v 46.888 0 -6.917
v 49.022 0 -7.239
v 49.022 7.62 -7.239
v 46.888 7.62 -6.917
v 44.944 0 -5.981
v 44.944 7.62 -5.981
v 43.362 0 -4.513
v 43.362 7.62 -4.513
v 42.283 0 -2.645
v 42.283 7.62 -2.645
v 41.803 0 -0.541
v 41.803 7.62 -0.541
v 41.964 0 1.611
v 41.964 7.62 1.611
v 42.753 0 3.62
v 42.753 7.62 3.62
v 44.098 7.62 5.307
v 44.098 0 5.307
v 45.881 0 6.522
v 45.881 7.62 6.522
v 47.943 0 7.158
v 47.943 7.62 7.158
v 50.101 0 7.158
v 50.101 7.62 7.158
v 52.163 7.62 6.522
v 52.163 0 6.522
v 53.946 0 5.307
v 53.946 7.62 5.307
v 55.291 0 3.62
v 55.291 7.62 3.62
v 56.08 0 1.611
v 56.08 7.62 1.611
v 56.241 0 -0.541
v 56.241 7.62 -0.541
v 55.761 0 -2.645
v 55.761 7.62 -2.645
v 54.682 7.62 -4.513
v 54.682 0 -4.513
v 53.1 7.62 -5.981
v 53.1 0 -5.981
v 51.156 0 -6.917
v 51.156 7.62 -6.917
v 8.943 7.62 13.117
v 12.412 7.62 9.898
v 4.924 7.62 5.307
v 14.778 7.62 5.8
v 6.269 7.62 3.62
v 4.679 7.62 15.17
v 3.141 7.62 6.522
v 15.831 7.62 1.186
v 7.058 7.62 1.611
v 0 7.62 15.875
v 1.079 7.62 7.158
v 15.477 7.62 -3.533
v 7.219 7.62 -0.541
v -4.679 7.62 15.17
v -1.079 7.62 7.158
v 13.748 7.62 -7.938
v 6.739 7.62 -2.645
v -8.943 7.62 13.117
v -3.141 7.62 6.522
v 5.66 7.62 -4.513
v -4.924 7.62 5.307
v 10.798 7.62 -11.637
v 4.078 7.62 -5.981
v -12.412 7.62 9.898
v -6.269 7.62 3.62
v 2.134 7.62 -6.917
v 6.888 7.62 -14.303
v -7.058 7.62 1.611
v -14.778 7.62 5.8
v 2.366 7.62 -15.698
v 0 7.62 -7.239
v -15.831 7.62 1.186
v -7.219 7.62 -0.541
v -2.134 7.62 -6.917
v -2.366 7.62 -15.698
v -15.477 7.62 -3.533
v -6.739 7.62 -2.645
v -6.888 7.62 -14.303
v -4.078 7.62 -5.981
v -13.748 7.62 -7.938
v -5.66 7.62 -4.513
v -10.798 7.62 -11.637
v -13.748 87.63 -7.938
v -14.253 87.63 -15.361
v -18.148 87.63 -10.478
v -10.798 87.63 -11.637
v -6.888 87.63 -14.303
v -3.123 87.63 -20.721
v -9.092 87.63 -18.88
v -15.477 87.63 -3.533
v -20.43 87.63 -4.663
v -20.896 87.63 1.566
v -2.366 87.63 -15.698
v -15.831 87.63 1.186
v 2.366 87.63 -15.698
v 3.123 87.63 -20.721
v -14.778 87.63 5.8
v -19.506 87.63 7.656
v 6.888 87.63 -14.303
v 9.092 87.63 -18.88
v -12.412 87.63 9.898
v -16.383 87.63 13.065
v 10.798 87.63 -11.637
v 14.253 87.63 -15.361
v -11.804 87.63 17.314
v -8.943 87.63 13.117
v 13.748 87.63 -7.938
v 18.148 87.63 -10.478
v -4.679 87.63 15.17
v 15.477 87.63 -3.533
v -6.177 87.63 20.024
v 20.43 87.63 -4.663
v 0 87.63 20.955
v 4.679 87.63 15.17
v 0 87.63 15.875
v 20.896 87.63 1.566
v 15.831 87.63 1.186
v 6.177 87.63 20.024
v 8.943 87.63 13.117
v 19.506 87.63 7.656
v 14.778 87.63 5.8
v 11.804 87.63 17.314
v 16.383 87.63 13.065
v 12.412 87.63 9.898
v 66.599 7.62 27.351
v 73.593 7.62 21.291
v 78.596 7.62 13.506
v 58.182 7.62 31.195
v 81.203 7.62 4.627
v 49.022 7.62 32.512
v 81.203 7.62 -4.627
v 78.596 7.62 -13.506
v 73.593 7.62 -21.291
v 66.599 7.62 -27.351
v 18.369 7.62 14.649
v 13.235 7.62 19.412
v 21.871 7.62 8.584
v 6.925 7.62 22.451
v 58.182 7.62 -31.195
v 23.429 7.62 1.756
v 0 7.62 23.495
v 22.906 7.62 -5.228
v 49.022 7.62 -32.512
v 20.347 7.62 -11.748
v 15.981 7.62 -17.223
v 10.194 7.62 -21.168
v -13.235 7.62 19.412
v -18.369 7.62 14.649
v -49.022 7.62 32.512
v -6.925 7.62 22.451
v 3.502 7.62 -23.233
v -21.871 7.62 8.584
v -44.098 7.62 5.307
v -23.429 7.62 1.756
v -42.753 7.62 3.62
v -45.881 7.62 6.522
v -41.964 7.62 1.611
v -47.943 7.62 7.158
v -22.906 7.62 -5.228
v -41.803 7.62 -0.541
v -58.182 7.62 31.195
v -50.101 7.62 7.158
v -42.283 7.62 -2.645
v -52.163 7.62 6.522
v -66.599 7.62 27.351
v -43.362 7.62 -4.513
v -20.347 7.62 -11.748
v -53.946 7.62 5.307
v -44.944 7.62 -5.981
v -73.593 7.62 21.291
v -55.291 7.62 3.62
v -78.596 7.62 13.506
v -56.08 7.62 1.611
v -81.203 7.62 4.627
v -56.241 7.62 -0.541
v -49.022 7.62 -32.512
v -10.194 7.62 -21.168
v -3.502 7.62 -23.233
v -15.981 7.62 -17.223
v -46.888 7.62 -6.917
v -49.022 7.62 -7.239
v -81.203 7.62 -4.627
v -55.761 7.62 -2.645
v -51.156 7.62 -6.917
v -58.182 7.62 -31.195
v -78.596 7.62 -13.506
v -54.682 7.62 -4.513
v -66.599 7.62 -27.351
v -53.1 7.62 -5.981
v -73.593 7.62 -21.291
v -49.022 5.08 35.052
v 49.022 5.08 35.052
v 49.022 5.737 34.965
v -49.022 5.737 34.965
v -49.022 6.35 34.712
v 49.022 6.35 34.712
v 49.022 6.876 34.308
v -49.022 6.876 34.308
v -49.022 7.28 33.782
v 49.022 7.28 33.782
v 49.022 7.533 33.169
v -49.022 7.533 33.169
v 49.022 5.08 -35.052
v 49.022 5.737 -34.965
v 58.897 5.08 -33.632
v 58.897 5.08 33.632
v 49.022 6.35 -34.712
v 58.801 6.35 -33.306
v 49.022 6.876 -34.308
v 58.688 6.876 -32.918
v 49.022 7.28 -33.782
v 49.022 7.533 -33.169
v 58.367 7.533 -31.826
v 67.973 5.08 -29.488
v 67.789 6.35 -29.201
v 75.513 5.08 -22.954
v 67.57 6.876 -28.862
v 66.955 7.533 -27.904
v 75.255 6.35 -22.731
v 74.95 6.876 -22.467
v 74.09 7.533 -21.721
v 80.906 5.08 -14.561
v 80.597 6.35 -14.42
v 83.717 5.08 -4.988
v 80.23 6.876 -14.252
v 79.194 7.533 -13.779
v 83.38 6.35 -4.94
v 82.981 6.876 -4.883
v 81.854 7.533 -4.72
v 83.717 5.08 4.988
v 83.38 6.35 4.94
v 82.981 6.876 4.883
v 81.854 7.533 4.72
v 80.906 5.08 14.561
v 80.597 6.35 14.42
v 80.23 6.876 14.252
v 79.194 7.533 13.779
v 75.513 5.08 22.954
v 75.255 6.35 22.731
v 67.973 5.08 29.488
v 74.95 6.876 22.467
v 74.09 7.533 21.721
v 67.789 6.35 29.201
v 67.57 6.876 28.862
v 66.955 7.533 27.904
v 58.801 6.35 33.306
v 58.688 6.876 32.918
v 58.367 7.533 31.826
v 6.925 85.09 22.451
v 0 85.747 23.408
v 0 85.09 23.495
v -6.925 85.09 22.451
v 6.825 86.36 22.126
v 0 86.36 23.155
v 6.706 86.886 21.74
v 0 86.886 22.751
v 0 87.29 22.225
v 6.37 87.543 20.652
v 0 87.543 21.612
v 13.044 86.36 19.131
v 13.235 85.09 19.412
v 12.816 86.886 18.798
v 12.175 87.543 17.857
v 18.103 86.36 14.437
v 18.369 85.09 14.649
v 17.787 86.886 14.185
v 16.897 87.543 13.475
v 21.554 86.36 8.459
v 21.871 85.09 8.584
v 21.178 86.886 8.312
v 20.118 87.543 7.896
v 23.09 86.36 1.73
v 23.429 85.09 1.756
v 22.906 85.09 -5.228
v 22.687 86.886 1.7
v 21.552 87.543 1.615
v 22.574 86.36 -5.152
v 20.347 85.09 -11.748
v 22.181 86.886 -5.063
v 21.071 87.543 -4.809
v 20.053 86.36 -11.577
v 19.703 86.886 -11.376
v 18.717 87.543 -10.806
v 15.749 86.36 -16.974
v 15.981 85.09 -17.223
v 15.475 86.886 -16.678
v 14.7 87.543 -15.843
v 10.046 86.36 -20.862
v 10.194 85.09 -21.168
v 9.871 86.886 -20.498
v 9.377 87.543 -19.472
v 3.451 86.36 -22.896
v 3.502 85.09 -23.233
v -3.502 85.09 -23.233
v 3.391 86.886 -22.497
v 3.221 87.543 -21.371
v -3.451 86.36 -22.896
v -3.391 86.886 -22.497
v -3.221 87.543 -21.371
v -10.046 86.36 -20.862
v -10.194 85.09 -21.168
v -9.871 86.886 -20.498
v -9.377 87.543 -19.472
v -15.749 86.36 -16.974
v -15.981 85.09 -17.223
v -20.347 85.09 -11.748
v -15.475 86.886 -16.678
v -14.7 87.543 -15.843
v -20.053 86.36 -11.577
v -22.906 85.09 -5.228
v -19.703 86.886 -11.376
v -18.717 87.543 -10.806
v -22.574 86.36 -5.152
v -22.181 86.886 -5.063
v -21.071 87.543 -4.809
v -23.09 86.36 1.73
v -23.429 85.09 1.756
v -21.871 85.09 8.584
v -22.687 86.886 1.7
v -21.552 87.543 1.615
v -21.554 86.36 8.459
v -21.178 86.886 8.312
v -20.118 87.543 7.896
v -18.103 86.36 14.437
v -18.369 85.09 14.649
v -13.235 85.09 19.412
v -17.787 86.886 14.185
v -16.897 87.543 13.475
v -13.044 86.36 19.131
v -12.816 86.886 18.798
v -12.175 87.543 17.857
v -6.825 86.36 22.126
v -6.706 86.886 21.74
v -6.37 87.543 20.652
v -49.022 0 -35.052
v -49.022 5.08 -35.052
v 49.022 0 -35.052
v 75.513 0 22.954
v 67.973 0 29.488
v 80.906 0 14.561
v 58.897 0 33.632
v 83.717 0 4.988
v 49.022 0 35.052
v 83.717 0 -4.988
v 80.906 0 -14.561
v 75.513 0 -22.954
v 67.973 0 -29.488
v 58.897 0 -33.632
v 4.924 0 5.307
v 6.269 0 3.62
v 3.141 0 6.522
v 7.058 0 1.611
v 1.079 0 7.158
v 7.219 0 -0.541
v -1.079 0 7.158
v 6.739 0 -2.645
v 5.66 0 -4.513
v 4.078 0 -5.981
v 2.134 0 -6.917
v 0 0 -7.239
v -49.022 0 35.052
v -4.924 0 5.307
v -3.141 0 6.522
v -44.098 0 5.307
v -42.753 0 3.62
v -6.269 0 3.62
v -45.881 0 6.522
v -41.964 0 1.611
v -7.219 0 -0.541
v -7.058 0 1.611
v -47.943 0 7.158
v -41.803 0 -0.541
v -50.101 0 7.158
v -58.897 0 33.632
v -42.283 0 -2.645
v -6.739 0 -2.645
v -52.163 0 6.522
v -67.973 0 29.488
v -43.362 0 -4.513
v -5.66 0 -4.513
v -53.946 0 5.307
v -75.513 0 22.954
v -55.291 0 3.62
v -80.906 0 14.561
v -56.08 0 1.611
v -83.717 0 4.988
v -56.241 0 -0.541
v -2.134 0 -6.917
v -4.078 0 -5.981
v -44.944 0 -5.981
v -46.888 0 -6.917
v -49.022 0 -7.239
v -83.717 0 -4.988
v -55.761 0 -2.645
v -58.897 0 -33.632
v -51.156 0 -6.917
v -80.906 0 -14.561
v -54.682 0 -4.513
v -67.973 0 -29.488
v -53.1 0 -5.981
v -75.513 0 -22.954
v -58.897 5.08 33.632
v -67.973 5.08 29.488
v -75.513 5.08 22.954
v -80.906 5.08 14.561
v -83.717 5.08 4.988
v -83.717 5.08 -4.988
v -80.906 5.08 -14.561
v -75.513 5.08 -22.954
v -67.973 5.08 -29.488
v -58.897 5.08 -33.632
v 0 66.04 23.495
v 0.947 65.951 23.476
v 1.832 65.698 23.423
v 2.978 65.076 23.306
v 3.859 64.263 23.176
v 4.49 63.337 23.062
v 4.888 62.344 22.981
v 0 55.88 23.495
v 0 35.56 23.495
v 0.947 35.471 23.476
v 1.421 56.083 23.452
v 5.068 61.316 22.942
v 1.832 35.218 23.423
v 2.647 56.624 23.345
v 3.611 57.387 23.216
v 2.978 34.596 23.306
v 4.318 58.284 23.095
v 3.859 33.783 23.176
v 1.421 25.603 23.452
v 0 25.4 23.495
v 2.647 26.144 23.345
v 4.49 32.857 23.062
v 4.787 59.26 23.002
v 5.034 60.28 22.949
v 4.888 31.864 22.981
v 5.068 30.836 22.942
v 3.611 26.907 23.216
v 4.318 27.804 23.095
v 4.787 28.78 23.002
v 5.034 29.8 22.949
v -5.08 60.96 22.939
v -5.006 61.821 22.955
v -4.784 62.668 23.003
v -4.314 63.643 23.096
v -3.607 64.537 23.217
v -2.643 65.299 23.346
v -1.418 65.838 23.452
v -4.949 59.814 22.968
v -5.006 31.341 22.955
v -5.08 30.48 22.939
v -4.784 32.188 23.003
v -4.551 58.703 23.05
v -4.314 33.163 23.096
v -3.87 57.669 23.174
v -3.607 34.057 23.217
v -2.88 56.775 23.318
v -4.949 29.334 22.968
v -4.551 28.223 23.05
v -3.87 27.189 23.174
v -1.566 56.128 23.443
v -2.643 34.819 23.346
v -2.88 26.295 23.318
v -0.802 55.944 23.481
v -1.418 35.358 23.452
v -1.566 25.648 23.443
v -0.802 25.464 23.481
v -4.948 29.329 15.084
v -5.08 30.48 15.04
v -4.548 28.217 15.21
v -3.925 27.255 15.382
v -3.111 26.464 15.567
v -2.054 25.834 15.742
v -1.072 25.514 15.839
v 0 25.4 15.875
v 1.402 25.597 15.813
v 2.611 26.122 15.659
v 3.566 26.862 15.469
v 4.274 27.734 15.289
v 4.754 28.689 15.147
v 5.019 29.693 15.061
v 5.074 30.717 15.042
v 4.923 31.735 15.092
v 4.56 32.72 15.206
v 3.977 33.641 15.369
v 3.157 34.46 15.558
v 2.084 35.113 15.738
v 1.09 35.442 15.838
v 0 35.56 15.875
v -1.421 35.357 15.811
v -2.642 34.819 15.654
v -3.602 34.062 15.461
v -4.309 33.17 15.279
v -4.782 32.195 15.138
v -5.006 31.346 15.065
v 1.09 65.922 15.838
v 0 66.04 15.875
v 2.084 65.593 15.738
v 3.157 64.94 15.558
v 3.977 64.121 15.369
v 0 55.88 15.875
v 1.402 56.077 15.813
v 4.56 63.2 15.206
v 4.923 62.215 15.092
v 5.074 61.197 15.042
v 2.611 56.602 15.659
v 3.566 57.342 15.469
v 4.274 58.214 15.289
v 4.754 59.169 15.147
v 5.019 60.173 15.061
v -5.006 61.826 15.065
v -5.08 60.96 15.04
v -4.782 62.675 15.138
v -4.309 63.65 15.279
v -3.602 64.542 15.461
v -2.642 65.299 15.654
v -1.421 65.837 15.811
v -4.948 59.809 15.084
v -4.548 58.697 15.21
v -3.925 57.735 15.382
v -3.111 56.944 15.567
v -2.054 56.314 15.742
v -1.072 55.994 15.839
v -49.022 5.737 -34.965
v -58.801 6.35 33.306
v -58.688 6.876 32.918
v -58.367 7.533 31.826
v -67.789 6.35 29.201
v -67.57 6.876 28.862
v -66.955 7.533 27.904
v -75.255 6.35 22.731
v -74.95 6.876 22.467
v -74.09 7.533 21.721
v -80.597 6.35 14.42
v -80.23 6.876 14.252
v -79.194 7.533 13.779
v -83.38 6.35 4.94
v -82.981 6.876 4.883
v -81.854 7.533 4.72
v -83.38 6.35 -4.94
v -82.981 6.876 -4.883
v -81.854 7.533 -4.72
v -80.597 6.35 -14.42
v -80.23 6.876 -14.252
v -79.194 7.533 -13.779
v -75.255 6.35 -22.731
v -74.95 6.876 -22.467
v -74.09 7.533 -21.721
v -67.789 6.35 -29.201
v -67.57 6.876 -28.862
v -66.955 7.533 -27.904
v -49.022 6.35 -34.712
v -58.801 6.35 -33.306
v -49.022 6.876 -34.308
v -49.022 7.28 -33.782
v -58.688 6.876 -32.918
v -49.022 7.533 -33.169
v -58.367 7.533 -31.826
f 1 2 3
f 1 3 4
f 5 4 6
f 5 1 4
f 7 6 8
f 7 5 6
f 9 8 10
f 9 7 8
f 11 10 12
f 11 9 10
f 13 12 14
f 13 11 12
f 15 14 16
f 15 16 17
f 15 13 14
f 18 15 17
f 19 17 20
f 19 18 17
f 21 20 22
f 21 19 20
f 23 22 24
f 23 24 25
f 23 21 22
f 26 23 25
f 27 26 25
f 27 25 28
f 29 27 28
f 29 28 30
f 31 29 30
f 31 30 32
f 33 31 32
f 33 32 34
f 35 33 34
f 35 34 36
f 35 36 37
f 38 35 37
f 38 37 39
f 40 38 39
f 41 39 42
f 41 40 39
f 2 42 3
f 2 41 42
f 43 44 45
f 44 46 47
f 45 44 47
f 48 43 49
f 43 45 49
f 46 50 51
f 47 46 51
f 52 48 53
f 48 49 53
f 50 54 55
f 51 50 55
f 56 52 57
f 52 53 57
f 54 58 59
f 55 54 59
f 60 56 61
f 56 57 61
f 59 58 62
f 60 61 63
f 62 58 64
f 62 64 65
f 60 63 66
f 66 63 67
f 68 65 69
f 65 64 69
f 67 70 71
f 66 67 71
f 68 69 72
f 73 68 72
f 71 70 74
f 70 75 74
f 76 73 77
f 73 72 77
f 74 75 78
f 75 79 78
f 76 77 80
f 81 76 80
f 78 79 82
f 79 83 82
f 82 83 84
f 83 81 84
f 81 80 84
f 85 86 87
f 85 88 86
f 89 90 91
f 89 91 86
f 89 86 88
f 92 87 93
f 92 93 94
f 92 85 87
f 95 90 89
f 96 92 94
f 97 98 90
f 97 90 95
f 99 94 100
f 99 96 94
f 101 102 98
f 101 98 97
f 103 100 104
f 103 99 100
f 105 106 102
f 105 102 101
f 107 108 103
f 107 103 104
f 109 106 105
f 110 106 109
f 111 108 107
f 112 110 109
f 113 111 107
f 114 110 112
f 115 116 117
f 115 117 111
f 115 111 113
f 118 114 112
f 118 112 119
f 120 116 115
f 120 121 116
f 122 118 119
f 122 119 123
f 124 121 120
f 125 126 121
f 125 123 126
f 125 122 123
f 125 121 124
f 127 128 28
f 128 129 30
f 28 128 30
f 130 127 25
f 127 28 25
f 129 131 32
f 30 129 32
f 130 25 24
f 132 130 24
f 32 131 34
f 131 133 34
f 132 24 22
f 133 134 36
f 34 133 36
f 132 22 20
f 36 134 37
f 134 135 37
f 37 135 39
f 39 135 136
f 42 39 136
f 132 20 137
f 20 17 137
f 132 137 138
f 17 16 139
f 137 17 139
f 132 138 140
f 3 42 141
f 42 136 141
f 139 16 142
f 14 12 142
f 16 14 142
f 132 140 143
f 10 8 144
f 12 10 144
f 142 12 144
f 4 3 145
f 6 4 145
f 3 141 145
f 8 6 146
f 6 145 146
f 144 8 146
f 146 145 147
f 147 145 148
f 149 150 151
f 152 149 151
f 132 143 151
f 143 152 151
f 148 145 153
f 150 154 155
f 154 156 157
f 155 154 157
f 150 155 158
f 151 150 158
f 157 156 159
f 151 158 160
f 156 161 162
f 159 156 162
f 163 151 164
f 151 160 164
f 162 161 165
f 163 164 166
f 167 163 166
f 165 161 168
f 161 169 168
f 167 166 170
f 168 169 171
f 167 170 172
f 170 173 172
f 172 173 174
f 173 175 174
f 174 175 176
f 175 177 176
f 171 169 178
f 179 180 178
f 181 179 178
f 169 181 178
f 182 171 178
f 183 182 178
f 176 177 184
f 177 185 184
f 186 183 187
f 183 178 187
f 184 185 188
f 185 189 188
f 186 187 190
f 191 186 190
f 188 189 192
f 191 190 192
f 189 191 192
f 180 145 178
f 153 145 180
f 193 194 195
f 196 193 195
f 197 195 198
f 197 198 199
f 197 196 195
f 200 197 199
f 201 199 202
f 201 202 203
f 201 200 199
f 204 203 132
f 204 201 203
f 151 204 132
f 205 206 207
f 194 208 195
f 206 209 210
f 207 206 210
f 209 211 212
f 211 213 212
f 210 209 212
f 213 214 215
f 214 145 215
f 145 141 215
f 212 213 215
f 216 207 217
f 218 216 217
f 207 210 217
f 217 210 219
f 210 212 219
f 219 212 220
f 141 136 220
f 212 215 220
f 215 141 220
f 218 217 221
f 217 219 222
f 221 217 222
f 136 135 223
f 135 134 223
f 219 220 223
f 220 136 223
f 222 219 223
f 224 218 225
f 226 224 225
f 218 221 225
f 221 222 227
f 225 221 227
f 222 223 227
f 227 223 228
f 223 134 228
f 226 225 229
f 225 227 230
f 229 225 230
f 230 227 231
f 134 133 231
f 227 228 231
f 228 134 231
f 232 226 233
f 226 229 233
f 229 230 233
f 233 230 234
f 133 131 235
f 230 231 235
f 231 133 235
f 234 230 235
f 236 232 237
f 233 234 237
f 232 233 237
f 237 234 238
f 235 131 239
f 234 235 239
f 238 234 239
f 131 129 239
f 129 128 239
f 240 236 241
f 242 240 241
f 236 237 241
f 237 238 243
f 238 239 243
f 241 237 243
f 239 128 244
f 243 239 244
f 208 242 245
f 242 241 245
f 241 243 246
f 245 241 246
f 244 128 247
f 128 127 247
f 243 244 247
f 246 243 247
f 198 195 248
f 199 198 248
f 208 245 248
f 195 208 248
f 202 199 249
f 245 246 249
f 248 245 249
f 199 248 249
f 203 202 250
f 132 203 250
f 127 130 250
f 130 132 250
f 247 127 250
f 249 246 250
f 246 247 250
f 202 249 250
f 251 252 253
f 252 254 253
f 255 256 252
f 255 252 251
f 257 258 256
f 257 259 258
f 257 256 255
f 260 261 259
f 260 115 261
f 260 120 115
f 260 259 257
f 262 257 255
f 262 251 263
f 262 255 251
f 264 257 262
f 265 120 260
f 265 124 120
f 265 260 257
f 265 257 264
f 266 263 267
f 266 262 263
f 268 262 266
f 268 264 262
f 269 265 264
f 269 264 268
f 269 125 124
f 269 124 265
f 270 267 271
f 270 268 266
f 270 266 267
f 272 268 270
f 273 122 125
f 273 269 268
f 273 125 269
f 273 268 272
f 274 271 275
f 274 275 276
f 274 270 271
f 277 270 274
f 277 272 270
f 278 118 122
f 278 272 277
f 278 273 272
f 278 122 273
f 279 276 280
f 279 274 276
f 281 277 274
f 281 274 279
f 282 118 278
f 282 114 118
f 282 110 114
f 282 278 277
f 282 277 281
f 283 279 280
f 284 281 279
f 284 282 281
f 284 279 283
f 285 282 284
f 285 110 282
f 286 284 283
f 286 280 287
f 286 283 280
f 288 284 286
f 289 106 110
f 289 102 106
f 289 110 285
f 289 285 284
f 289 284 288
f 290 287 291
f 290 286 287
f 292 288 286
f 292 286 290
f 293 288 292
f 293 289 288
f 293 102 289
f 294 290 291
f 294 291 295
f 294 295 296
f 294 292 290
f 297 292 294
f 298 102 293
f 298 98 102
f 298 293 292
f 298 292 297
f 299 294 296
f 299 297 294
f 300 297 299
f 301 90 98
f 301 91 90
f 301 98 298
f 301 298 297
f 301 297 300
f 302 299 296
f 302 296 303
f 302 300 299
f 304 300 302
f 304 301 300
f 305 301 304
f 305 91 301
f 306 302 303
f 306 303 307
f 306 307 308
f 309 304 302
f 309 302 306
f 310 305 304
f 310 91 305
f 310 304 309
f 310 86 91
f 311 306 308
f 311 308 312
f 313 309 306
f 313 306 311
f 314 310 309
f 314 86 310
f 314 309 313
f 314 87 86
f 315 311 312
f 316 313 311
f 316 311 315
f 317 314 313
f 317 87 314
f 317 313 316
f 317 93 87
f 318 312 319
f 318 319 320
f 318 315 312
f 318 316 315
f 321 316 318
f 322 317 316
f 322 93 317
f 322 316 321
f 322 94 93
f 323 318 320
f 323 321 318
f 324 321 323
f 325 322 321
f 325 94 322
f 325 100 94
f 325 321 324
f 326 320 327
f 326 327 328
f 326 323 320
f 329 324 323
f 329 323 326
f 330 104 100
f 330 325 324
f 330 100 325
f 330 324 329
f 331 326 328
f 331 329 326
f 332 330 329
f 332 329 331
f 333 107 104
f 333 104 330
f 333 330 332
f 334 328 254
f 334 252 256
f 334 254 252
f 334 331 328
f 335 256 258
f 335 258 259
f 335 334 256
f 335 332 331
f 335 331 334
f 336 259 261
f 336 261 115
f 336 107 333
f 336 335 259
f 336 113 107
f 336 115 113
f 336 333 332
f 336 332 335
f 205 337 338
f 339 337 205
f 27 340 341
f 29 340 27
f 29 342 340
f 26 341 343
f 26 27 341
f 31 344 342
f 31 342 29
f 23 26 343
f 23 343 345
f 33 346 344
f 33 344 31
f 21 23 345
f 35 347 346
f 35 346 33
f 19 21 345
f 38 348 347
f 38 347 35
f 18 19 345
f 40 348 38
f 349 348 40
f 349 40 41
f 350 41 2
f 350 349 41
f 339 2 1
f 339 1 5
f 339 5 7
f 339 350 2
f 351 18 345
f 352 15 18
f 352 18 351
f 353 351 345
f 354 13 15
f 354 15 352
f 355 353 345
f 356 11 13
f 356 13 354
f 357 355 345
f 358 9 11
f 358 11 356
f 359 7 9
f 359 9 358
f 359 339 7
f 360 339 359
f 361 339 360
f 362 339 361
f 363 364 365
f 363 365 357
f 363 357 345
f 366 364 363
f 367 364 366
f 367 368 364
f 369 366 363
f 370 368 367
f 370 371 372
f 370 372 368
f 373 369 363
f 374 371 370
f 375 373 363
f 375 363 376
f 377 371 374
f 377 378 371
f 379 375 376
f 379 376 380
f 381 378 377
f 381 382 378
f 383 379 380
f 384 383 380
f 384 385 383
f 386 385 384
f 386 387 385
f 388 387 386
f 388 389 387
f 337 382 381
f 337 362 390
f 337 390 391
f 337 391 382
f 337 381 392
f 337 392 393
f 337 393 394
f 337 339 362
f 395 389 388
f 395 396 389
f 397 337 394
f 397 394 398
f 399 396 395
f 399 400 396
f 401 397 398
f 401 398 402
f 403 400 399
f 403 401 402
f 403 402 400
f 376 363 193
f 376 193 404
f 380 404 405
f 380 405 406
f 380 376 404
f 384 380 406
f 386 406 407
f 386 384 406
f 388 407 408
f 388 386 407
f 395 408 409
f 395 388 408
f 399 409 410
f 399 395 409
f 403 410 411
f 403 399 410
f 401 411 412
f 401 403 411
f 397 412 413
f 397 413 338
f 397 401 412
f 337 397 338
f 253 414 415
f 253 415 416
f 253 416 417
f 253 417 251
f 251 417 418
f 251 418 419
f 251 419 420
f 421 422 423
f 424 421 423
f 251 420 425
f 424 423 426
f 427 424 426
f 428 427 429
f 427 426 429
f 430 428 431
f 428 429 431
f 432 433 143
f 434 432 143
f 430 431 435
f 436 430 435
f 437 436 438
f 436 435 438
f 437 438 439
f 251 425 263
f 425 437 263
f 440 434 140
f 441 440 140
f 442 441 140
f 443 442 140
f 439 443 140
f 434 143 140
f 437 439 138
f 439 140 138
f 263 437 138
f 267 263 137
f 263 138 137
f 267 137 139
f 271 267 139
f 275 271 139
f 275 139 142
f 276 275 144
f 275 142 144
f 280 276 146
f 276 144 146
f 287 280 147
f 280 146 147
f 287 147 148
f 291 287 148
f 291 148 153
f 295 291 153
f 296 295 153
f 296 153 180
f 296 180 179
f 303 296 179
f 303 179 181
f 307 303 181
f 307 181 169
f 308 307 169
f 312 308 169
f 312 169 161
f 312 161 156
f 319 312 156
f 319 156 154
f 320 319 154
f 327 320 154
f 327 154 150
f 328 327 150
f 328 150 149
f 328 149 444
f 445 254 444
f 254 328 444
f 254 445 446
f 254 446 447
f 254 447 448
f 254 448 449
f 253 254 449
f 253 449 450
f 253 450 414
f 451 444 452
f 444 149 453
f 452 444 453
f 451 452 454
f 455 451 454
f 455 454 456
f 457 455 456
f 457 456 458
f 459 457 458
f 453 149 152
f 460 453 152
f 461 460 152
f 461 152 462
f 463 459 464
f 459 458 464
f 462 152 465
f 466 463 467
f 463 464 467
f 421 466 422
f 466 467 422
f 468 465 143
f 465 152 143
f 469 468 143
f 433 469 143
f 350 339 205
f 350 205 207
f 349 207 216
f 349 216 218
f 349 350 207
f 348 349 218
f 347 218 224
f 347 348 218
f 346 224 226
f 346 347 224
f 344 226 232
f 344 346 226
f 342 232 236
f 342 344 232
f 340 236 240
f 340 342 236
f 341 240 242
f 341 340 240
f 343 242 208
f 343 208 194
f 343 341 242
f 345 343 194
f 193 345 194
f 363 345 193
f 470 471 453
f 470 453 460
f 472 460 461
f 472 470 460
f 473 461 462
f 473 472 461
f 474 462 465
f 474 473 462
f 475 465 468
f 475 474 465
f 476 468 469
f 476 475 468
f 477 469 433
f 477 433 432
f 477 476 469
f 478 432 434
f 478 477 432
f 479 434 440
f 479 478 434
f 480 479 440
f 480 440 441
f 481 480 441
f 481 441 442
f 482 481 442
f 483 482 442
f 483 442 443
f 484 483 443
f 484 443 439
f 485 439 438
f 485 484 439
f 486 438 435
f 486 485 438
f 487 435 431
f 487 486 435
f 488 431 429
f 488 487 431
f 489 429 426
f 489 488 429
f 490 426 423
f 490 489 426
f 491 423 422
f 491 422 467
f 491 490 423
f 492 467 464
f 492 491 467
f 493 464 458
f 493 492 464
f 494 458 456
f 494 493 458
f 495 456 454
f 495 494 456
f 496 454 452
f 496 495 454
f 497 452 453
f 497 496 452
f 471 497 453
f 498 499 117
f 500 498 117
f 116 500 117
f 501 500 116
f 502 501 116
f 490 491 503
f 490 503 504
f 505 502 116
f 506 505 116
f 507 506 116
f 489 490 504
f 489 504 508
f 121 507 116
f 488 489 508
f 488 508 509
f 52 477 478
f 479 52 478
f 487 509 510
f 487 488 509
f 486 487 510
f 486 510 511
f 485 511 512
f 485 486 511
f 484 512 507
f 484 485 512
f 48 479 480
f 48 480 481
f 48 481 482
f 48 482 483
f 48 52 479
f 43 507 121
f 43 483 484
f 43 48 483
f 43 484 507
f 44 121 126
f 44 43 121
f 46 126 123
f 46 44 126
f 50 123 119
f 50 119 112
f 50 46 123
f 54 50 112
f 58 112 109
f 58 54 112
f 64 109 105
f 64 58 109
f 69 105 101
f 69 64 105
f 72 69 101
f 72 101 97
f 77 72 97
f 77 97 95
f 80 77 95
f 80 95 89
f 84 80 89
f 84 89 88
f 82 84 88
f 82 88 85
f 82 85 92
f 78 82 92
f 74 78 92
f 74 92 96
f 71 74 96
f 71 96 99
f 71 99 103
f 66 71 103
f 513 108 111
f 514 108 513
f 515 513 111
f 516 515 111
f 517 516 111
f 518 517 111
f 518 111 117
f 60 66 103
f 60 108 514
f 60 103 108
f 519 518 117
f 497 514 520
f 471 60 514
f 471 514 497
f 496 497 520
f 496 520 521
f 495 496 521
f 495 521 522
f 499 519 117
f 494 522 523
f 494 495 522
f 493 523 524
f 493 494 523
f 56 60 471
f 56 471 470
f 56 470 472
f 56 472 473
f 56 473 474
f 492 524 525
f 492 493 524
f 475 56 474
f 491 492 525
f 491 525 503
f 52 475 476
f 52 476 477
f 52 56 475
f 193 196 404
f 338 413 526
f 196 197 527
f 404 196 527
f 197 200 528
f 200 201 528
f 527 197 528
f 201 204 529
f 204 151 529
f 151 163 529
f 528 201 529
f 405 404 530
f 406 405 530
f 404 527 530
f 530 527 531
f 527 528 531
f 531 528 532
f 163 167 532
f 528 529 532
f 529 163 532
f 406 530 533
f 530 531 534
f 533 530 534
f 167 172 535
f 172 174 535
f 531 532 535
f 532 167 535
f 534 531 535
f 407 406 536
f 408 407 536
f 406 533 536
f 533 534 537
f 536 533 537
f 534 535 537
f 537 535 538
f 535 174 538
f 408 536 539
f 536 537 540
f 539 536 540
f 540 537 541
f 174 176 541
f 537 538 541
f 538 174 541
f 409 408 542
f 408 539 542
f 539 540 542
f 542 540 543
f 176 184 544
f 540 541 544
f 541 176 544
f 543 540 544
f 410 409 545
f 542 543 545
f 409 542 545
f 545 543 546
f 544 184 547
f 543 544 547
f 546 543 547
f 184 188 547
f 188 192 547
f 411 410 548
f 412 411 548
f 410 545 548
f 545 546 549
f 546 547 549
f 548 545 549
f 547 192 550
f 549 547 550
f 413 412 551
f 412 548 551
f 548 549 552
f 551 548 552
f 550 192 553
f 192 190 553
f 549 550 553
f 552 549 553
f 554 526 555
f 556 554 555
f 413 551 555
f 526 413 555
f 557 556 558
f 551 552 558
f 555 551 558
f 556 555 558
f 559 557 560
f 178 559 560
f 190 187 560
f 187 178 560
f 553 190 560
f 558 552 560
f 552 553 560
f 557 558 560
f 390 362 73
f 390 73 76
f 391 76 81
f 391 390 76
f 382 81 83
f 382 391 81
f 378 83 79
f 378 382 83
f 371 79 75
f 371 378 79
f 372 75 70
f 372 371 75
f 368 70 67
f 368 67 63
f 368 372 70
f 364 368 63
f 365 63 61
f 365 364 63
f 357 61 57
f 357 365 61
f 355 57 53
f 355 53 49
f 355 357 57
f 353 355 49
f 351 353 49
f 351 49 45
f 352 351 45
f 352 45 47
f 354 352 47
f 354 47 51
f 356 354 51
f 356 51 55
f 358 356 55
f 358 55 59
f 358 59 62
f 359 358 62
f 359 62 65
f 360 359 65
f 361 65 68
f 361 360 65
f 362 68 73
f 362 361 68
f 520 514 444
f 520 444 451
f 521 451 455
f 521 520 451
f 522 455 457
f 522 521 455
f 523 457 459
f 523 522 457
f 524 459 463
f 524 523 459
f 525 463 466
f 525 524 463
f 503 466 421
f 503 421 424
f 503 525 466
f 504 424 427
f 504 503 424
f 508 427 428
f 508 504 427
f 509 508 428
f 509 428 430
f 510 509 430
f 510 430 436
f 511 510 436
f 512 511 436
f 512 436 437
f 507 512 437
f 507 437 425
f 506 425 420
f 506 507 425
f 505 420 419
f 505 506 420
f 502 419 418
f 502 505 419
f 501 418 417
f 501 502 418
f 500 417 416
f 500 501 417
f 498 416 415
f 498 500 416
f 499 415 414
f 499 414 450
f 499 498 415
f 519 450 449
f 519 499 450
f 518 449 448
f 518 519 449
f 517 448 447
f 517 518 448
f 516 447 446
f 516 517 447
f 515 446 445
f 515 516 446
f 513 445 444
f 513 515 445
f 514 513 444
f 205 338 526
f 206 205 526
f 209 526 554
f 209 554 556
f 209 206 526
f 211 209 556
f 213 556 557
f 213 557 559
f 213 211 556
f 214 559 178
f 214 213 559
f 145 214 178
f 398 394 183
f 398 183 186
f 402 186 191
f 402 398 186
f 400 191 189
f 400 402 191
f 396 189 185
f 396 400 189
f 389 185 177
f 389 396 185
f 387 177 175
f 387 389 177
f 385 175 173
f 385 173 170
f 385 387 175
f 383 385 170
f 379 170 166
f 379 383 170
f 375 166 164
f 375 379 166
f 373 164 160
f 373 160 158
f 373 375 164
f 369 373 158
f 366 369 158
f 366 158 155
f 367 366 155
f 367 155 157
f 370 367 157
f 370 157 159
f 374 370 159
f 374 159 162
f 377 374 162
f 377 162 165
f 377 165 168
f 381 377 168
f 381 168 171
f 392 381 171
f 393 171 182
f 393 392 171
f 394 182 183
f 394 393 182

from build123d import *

# Parameters (mm, degrees)
SKETCH1_R           = 7.239
BOSS_EXTRUDE1_DEPTH = 7.62
SKETCH2_R           = 23.495
SKETCH2_R_2         = 15.875
BOSS_EXTRUDE2_DEPTH = 80.01
FILLET1_R           = 2.54
SKETCH4_R           = 5.08
CUT_EXTRUDE1_DEPTH  = 80.01


with BuildPart() as part:
    # Sketch1 → Boss-Extrude1 (new body)
    with BuildSketch(Plane(origin=(0, 0, 0), x_dir=(1, 0, 0), z_dir=(0, 1, 0))):
        with BuildLine():
            Line((-49.022, 35.052), (49.022, 35.052))
            ThreePointArc((49.022, 35.052), (84.074, 0), (49.022, -35.052))
            Line((49.022, -35.052), (-49.022, -35.052))
            ThreePointArc((-49.022, -35.052), (-84.074, 0), (-49.022, 35.052))
        make_face()
        with Locations(Location((-49.022, 0, 0), (0, 0, 90))):
            Circle(SKETCH1_R, mode=Mode.SUBTRACT)
        with Locations(Location((49.022, 0, 0), (0, 0, 90))):
            Circle(SKETCH1_R, mode=Mode.SUBTRACT)
        with Locations(Location((0, 0, 0), (0, 0, 90))):
            Circle(SKETCH1_R, mode=Mode.SUBTRACT)
    extrude(amount=BOSS_EXTRUDE1_DEPTH)

    # Sketch2 → Boss-Extrude2 (add)
    with BuildSketch(Plane(origin=(0, 7.62, 0), x_dir=(1, 0, 0), z_dir=(0, 1, 0))):
        with Locations(Location((0, 0, 0), (0, 0, 270))):
            Circle(SKETCH2_R)
        with Locations(Location((0, 0, 0), (0, 0, 270))):
            Circle(SKETCH2_R_2, mode=Mode.SUBTRACT)
    extrude(amount=BOSS_EXTRUDE2_DEPTH)

    # Fillet1
    fillet1_edges = [part.edges().sort_by_distance(p)[0] for p in [
        (84.074, 7.62, 0),
        (0, 7.62, -35.052),
        (0, 87.63, -23.495),
        (-84.074, 7.62, 0),
        (0, 7.62, 35.052),
    ]]
    fillet(fillet1_edges, radius=FILLET1_R)

    # Sketch4 → Cut-Extrude1 (cut)
    with BuildSketch(Plane.XY):
        with Locations(Location((0, 60.96, 0), (0, 0, 180))):
            Circle(SKETCH4_R)
        with Locations(Location((0, 30.48, 0), (0, 0, 180))):
            Circle(SKETCH4_R)
    extrude(amount=CUT_EXTRUDE1_DEPTH, mode=Mode.SUBTRACT)


solid = part.part
